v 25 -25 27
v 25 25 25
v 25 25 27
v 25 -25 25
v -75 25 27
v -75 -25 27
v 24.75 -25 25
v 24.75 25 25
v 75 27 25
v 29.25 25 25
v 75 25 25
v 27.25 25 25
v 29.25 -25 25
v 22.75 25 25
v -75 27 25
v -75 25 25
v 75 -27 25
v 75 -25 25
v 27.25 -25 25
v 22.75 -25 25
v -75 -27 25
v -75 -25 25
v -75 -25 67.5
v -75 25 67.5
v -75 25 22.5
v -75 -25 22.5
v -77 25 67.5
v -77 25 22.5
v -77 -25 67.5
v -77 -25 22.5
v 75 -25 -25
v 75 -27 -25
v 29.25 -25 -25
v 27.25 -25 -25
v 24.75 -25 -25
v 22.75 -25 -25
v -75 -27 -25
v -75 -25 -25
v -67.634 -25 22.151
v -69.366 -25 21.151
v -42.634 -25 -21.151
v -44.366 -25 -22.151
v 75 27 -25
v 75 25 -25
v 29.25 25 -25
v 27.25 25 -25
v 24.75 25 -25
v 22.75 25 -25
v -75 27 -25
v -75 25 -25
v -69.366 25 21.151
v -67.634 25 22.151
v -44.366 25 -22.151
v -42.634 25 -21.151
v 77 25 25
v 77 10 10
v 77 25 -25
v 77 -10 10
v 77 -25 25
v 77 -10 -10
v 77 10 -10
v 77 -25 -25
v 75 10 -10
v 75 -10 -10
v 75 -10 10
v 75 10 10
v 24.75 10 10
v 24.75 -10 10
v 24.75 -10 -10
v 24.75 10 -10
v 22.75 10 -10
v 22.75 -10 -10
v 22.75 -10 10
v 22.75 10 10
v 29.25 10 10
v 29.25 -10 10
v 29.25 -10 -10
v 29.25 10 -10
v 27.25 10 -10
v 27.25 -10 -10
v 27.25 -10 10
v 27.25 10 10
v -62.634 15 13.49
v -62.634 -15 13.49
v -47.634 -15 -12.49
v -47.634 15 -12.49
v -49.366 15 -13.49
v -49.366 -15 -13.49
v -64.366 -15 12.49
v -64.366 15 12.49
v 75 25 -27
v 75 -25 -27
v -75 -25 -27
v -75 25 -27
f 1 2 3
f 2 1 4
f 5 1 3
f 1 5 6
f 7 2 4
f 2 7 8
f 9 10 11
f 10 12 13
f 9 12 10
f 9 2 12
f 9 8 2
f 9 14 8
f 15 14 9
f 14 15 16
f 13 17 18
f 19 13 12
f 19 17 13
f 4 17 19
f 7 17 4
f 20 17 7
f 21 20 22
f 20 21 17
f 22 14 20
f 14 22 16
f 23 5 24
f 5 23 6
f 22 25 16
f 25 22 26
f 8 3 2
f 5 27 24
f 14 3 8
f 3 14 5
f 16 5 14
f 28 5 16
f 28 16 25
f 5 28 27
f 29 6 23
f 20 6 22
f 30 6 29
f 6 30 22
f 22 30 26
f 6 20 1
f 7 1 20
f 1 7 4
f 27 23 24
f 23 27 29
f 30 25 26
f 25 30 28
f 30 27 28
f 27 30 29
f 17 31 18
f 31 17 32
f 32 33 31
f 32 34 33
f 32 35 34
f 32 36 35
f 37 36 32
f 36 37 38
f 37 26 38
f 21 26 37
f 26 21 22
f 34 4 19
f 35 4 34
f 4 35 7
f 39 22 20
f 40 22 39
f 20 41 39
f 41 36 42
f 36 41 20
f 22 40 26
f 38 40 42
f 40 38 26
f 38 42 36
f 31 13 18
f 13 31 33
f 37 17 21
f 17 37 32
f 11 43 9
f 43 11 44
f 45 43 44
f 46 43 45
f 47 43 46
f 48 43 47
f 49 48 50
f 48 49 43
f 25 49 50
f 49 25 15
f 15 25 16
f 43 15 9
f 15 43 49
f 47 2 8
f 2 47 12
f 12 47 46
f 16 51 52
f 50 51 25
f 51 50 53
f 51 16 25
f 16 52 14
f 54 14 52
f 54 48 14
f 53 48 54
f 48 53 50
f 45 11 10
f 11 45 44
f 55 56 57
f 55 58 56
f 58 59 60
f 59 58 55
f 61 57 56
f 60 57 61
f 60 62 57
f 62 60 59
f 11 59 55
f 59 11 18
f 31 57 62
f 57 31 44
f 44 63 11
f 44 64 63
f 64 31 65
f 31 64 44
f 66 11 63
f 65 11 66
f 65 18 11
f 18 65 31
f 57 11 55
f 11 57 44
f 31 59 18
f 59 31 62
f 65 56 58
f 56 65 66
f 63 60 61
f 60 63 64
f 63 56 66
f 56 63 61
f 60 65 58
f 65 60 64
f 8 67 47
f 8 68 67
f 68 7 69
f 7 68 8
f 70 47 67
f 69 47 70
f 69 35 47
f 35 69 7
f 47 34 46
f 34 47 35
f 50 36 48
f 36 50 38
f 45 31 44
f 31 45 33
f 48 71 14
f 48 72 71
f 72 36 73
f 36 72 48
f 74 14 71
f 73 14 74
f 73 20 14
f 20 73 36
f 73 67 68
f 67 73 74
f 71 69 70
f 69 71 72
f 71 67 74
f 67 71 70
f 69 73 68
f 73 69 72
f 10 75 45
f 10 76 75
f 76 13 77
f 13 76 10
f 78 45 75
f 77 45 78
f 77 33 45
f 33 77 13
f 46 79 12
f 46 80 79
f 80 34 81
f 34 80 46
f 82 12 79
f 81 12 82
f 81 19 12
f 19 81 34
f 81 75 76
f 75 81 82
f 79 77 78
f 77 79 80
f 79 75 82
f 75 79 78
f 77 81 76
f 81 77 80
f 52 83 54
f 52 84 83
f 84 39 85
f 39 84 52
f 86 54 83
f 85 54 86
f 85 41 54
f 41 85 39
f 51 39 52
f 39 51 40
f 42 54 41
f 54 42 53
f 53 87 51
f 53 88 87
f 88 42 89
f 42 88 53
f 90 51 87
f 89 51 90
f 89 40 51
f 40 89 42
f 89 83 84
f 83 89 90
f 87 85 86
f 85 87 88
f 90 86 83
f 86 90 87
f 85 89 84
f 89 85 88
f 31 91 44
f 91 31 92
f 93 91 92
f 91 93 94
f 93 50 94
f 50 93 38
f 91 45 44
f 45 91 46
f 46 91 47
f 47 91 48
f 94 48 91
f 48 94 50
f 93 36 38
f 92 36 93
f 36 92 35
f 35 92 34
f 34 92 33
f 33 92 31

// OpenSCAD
$fn = 50;

wall = 2;
gap = 0.5;

box_sz_x = 150;
box_sz_y = 50;
box_sz_z = 50;

window_sz_y = 20;
window_sz_z = 20;

cam_window_sz_y = 30;
cam_window_sz_z = 30;

cam_wall_offset = 20;
cam_wall_angle = 30;
cam_wall_sz_z = box_sz_z / cos(cam_wall_angle);
cam_wire_sz_z = 5;

middle_wall_offset = 50;
middle_insert_hole_sz_x = wall + gap;

slot_sz_y = 30;
slot_sz_z = 1;

module sp_base() {
	// bottom
	translate([0, 0, -(box_sz_z+wall)/2]) {
		cube([box_sz_x, box_sz_y, wall], center=true);
	}
	// side walls
	for(ysgn = [-1, 1]) {
		translate([0, ysgn*(box_sz_y+wall)/2, 0]) {
			cube([box_sz_x, wall, box_sz_z], center=true);
		}
	}
	// window wall
	translate([(box_sz_x+wall)/2, 0, 0]) {
		difference() {
			cube([wall, box_sz_y, box_sz_z], center=true);
			cube([wall, window_sz_y, window_sz_z], center=true);
		}
	}
	// middle insert holder
	translate([(box_sz_x+wall)/2-middle_wall_offset, 0, 0]) {
		for(xsgn=[-1, 1]) {
			translate([xsgn*(middle_insert_hole_sz_x+wall)/2, 0, 0]) {
				difference() {
					cube([wall, box_sz_y, box_sz_z], center=true);
					cube([wall, window_sz_y, window_sz_z], center=true);
				}
			}
		}
	}
	// camera wall
	translate([-(box_sz_x+wall)/2+cam_wall_offset, 0, 0]) {
		rotate([0, -cam_wall_angle, 0]) {
			difference() {
				cube([wall, box_sz_y, box_sz_z], center=true);
				cube([wall, cam_window_sz_y, cam_window_sz_z], center=true);
			}
		}
	}
}

module top_lid() {
	// top
	translate([-middle_wall_offset/2, 0, (box_sz_z+wall)/2]) {
		cube([box_sz_x-middle_wall_offset, box_sz_y, wall], center=true);
	}
	translate([-(box_sz_x+wall)/2, 0, box_sz_z-cam_wire_sz_z]) {
		cube([wall, box_sz_y, box_sz_z-cam_wire_sz_z], center=true);
	}
}

module slot_insert() {
	difference() {
		cube([wall, box_sz_y, box_sz_z], center=true);
		cube([wall, slot_sz_y, slot_sz_z], center=true);
	}
}


top_lid();
sp_base();
translate([middle_wall_offset, 0, 0]) {
//	slot_insert();
}
